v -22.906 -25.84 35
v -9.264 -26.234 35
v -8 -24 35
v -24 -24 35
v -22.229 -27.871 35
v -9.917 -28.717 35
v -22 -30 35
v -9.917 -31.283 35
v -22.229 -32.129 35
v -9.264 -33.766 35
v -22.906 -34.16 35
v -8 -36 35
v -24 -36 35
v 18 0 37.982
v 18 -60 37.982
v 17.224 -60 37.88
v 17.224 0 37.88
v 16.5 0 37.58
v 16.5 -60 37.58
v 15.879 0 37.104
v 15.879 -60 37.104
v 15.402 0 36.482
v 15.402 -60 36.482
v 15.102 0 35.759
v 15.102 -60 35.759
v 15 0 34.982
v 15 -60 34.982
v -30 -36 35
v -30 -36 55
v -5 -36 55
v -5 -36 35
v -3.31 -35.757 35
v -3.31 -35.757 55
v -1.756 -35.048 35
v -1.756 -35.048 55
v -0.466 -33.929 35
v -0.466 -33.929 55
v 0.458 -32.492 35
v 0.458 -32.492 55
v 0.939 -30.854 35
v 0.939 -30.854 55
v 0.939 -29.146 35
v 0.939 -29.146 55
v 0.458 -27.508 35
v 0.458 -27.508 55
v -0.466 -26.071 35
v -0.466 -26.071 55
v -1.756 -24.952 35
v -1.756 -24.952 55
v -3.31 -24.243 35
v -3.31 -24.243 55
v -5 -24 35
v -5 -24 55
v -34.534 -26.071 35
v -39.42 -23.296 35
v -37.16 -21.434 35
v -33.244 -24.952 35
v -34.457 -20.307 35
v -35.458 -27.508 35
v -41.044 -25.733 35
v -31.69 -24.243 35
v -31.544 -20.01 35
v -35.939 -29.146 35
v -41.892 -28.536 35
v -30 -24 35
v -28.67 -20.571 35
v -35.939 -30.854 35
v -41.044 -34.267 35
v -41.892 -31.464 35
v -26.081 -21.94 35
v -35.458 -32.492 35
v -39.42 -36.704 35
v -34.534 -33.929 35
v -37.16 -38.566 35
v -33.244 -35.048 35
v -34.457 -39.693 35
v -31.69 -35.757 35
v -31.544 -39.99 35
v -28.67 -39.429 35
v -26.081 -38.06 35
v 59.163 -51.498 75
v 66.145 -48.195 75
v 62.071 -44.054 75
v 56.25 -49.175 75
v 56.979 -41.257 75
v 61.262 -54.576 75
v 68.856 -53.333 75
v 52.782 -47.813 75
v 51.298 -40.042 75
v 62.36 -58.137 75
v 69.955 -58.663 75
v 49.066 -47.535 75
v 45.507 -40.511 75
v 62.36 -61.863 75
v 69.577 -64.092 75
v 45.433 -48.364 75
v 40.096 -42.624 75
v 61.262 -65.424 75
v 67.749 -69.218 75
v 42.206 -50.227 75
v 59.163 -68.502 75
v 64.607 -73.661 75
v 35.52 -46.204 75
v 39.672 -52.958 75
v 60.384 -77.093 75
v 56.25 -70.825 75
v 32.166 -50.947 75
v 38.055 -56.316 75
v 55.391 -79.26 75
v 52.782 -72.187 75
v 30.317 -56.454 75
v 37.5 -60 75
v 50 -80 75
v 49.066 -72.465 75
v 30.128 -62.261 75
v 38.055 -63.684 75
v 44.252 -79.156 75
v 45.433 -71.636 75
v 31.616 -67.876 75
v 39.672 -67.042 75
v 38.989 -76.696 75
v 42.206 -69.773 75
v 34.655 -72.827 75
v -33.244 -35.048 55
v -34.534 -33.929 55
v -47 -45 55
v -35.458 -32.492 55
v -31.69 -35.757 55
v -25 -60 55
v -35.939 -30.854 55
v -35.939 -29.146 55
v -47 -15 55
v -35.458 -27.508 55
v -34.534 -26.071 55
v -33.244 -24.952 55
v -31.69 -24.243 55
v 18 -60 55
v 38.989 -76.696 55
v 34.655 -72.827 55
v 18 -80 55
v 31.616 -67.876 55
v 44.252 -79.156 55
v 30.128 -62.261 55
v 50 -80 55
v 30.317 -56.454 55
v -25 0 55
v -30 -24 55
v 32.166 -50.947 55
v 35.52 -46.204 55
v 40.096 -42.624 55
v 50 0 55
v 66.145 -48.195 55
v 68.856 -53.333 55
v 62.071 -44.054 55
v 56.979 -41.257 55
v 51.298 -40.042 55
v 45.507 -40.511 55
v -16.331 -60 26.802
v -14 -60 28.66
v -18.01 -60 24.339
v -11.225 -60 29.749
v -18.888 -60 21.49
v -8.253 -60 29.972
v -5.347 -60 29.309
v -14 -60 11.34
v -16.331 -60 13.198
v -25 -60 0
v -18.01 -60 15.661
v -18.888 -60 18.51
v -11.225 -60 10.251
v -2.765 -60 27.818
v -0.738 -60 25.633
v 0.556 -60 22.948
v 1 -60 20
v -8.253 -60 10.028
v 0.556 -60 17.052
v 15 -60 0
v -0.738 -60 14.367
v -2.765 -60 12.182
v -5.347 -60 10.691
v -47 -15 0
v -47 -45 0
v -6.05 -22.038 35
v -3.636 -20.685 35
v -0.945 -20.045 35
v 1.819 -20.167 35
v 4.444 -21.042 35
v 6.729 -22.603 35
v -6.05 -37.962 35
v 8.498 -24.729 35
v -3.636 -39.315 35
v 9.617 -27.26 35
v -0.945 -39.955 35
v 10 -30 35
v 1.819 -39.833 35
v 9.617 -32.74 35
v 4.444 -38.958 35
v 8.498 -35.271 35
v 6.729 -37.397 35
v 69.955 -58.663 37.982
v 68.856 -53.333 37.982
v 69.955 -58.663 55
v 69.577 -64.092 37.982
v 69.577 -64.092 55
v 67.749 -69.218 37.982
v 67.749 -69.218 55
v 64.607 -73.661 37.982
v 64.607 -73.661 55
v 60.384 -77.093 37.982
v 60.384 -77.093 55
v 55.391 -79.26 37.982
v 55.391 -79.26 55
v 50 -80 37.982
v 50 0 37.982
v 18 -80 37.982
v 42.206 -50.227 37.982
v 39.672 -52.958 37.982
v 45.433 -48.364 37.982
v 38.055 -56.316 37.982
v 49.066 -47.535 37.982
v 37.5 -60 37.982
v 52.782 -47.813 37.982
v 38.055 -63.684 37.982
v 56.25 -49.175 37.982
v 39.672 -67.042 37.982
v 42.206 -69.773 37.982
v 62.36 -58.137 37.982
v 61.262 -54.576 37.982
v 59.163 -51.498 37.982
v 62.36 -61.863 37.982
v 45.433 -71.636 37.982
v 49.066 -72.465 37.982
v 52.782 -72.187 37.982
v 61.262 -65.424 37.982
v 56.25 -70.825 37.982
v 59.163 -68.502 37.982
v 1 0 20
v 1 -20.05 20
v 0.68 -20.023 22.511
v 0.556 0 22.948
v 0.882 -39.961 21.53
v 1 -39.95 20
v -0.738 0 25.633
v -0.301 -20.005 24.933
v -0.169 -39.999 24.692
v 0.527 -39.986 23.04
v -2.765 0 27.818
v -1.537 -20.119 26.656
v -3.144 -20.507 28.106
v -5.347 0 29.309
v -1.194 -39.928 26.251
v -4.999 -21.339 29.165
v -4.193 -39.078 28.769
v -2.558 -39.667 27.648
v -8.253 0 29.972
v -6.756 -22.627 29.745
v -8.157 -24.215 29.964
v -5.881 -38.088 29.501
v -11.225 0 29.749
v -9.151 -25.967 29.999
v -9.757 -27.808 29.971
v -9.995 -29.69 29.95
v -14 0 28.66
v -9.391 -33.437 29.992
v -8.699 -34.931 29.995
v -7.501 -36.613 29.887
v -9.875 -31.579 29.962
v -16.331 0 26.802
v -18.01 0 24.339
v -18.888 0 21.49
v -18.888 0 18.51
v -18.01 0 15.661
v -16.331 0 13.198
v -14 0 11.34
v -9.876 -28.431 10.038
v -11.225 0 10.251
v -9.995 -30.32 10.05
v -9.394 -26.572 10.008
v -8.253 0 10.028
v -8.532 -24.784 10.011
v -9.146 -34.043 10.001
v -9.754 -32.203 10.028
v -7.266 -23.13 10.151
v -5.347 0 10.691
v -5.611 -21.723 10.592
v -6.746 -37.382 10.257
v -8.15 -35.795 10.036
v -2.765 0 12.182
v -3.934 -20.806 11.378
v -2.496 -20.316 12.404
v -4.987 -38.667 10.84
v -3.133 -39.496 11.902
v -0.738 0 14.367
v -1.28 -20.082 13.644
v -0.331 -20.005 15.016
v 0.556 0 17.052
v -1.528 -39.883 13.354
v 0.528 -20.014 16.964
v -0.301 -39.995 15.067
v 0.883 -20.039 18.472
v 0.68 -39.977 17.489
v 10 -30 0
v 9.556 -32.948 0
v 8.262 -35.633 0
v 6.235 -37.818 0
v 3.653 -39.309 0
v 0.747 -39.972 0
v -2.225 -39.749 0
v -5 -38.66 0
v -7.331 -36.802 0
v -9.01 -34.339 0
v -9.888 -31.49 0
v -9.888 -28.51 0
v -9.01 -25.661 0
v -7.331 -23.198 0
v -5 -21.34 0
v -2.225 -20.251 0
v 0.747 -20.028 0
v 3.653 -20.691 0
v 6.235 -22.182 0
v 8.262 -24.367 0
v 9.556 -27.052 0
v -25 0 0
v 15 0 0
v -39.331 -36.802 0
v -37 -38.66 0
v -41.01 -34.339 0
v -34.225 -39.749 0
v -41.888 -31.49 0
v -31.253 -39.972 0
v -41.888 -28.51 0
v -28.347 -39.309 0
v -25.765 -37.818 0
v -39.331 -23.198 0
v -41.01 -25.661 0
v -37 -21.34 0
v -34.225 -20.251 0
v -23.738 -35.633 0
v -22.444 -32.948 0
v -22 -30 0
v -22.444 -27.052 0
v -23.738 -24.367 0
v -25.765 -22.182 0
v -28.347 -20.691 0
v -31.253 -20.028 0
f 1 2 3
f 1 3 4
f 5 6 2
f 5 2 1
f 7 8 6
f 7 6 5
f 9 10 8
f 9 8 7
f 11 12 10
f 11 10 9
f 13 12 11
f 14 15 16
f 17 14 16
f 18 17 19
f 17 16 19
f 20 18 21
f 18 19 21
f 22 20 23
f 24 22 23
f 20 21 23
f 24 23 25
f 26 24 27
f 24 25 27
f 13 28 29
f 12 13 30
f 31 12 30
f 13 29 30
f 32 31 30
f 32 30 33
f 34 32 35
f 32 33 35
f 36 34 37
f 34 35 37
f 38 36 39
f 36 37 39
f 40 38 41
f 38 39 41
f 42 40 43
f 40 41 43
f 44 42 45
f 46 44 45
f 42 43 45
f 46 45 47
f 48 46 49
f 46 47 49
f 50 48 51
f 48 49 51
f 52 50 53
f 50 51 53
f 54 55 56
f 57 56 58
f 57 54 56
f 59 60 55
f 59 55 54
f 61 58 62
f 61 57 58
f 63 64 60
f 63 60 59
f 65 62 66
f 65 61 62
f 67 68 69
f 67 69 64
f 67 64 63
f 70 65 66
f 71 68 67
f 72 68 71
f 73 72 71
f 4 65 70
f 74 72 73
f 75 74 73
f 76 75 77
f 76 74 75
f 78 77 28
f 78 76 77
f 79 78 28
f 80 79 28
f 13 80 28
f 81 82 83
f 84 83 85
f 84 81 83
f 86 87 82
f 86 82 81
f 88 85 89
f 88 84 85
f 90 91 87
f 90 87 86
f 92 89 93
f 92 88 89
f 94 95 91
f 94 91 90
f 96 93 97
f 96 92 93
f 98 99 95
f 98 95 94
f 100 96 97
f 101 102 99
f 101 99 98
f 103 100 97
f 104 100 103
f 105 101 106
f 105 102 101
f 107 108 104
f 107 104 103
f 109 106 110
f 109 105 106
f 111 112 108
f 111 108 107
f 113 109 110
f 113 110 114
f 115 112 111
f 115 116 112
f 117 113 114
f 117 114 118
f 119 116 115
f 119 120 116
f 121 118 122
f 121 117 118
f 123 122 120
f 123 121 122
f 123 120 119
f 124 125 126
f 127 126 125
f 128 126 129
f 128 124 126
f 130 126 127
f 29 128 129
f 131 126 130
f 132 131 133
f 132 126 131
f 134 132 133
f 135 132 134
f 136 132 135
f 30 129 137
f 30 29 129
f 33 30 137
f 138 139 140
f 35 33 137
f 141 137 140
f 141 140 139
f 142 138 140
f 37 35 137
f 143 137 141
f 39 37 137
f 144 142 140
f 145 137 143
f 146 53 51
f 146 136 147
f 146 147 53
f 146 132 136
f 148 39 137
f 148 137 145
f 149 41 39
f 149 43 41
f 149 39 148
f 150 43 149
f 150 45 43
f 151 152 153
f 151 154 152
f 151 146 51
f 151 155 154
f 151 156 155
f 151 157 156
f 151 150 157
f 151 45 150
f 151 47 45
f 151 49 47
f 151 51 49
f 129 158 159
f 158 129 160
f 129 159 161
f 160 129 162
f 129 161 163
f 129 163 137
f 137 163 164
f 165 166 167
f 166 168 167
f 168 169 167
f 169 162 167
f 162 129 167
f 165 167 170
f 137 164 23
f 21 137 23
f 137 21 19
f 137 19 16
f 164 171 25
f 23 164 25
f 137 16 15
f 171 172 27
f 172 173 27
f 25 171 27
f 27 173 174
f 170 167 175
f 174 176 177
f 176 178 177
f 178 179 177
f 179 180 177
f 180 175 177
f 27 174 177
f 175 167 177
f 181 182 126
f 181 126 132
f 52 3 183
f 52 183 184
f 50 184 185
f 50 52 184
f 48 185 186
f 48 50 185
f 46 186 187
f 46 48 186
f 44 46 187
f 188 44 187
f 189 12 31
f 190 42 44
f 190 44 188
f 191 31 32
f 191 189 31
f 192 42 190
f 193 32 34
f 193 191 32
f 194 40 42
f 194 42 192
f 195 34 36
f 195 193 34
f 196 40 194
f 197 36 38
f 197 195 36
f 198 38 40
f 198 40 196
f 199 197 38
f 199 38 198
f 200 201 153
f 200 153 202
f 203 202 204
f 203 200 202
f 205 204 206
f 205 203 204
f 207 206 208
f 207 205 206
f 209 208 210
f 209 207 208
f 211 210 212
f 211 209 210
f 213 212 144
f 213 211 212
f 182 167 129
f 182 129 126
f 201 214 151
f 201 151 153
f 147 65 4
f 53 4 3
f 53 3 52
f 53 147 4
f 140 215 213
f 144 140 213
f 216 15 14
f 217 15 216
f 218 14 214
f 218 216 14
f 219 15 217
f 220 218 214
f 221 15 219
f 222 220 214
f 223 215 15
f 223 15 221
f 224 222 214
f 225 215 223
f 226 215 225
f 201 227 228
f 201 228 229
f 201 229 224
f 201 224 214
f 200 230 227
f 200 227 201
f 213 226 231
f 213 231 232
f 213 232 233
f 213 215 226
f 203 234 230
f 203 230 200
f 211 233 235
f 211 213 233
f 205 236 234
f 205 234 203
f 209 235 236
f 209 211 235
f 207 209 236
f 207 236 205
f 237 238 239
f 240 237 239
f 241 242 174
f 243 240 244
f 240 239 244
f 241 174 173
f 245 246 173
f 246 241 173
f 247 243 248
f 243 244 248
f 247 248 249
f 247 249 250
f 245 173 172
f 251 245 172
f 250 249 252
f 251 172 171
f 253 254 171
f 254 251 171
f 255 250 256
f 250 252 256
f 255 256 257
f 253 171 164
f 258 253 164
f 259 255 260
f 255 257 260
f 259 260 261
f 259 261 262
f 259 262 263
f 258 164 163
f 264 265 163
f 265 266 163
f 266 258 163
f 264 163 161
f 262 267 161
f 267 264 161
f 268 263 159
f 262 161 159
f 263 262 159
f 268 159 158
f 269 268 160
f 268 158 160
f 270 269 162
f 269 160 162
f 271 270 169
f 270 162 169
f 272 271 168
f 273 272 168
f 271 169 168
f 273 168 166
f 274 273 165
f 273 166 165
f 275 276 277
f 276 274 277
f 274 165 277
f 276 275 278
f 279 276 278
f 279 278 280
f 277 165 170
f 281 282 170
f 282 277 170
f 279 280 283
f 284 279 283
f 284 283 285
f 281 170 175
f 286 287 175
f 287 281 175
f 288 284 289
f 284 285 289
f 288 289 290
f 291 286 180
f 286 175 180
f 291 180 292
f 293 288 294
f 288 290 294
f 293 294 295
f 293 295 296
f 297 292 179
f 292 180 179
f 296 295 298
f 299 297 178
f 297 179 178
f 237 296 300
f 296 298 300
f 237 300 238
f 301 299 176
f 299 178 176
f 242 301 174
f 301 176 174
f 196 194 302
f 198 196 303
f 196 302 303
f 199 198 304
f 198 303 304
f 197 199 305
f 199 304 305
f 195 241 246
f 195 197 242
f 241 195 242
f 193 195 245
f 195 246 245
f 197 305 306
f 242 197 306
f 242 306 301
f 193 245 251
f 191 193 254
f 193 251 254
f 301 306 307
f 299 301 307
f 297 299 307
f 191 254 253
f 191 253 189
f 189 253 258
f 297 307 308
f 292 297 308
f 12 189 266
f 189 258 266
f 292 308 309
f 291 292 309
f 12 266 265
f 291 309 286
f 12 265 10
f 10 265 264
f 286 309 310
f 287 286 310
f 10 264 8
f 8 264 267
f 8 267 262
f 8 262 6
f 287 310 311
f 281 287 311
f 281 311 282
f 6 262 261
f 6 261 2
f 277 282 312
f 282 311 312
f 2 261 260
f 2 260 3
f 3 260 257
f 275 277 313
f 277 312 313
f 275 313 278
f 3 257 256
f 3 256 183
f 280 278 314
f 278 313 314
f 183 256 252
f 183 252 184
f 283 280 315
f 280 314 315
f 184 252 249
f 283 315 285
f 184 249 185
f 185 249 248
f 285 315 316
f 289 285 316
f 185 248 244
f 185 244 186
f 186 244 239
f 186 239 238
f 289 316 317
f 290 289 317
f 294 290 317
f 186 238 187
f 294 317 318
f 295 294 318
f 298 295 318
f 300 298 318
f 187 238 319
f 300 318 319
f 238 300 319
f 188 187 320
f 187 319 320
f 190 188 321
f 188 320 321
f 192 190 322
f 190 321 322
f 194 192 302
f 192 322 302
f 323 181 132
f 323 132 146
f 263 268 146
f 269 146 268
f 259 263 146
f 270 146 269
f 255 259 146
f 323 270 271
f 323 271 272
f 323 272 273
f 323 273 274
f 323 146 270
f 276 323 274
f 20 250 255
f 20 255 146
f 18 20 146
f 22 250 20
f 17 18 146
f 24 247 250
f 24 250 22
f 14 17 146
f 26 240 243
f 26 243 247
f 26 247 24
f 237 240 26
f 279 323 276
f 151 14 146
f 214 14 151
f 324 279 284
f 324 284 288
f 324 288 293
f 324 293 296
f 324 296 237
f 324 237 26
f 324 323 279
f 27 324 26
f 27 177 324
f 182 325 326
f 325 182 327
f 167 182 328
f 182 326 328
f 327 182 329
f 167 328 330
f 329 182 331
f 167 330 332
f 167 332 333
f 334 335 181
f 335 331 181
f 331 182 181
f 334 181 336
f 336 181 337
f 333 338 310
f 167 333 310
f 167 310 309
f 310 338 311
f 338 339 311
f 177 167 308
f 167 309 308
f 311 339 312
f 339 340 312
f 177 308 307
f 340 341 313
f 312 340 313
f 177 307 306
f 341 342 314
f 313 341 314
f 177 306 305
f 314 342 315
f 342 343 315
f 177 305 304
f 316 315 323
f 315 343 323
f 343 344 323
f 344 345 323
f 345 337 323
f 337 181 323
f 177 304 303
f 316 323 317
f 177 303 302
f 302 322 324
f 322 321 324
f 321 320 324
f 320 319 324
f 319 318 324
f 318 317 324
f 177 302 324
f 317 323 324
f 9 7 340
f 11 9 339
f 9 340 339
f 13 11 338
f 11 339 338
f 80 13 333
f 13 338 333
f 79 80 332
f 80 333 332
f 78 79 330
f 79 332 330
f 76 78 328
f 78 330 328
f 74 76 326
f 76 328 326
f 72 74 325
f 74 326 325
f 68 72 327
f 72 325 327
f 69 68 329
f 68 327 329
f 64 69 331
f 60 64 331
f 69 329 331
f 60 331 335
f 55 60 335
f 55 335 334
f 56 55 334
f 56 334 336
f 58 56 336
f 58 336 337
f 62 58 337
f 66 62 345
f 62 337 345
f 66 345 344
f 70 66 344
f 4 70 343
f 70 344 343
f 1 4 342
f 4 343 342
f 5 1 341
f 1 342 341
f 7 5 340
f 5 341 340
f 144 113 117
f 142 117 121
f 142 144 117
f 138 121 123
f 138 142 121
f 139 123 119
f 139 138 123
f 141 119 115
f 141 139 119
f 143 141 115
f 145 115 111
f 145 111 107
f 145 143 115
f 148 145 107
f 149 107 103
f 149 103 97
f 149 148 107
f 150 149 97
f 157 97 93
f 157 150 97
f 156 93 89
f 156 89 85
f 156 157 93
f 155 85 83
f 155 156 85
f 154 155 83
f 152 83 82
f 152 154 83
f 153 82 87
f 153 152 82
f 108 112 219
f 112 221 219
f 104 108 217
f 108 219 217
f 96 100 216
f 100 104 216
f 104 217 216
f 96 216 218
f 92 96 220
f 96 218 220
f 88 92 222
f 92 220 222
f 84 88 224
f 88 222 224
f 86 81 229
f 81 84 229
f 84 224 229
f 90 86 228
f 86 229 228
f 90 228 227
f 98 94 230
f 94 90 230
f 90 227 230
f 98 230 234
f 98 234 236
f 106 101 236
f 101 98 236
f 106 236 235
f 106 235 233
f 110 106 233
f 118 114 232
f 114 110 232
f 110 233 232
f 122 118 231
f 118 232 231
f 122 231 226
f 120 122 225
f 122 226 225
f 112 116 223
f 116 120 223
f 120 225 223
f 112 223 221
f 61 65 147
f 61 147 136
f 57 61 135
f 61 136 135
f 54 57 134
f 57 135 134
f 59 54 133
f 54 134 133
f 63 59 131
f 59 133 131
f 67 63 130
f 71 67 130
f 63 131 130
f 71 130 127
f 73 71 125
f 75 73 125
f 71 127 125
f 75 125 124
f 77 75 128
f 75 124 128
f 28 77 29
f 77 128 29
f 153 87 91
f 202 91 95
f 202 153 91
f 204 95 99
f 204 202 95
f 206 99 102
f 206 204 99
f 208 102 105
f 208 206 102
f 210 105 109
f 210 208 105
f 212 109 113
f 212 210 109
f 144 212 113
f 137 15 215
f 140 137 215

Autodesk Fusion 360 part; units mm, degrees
sketch "Sketch1" plane through (0, 0, 0) normal (0, 0, 1) x (1, 0, 0)
  line L0 (0, 0) -> (50, 0)
  line L1 (0, 0) -> (-25, 0)
  line L2 (-47, -30) -> (50, -30)
  line L3 (-47, -30) -> (-47, -15)
  line L4 (-47, -30) -> (-47, -45)
  line L5 (-47, -15) -> (-25, 0)
  line L6 (-25, 0) -> (-25, -30)
  line L7 (-25, -30) -> (-25, -60)
  line L8 (-25, -60) -> (-47, -45)
  line L9 (-25, -60) -> (18, -60)
  line L10 (18, -60) -> (18, -30)
  line L11 (50, -30) -> (50, -60)
  circle A0 centre (50, -60) radius 12.5
  circle A1 centre (50, -60) radius 20
  line L12 (18, -60) -> (18, -80)
  line L13 (18, -80) -> (50, -80)
  line L14 (50, 0) -> (68.8562, -53.3333)
  dimension "d3" = 50
  dimension "d4" = 25
  dimension "d8" = 15
  dimension "d9" = 15
  dimension "d11" = 30
  dimension "d12" = 25
  dimension "d13" = 40
extrude "Extrude1" add sketch "Sketch1" along normal blind 55 contours L0 L1 L2 L6 L11 A1 L14 | L2 L3 L5 L6 | A0 | A1 | L2 L4 L7 L8 | L2 L7 L9 L10 | L2 L10 L11 A1 L12 L13
sketch "Sketch2" plane through (0, -80, 0) normal (0, -1, 0) x (1, 0, 0)
  line L0 (18, 0) -> (50, 0)
  line L1 (50, 0) -> (50, 55)
  line L2 (50, 55) -> (18, 55)
  line L3 (18, 55) -> (18, 0)
  line L4 (15, -0.0176) -> (15, 34.9824)
  line L5 (15, 34.9824) -> (18, 34.9824)
  circle A0 centre (18, 34.9824) radius 3
  line L6 (18, 34.9824) -> (18, 37.9824)
  line L7 (70.6384, 36.4824) -> (70.6384, -2.3651)
  line L8 (70.6384, -2.3651) -> (18, 0)
  line L9 (18, 37.9824) -> (30, 37.9824)
  line L10 (30, 37.9824) -> (71, 37.9824)
  line L11 (71, 37.9824) -> (70.6384, 36.4824)
  dimension "d17" = 35
  dimension "d19" = 3
  dimension "d20" = 6
extrude "Extrude2" cut sketch "Sketch2" against normal blind 115 contours L0 L1 L3 A0 L9 L10 | L0 L1 L7 L8 L10 L11 | L3 L5 A0 | L3 A0 L6 | L3 L5 A0 L6
sketch "Sketch3" plane through (0, -60, 0) normal (0, -1, 0) x (1, 0, 0)
  arc A0 (18, 37.9824) -> (18, 31.9824) centre (18, 34.9824) ccw
  line L0 (18, 37.9824) -> (18, 55)
  line L1 (18, 55) -> (-25, 55)
  line L2 (-25, 55) -> (-25, 0)
  line L3 (-25, 0) -> (18, 0)
  line L4 (18, 0) -> (18, 31.9824)
  line L5 (15, 34.9824) -> (18, 34.9824)
  line L6 (18, 34.9824) -> (18, 0)
  line L7 (18, 0) -> (15, 0)
  line L8 (15, 0) -> (15, 34.9824)
extrude "Extrude3" cut sketch "Sketch3" against normal blind 120 contours A0 L3 L4 L6 L7 L8
sketch "Sketch4" plane through (0, 0, 55) normal (0, 0, 1) x (-1, 0, 0)
  line L0 (-50, 0) -> (25, 0)
  line L1 (25, 0) -> (47, 15)
  line L2 (47, 15) -> (47, 45)
  line L3 (47, 45) -> (25, 60)
  line L4 (25, 60) -> (-18, 60)
  line L5 (-18, 60) -> (-18, 80)
  line L6 (-18, 80) -> (-50, 80)
  arc A0 (-50, 80) -> (-68.8562, 53.3333) centre (-50, 60) ccw
  line L7 (-68.8562, 53.3333) -> (-50, 0)
  line L8 (-50, 80) -> (-50, 60)
  line L9 (-50, 60) -> (-70, 60)
  circle A1 centre (-50, 60) radius 12.5
  dimension "d25" = 25
extrude "Extrude4" cut sketch "Sketch4" against normal blind 50 contours L8 L9 A1 | L8 L9 A1
sketch "Sketch5" plane through (0, 0, 55) normal (0, 0, 1) x (-1, 0, 0)
  circle A0 centre (-50, 60) radius 12.5
  line L0 (-50, 0) -> (25, 0)
  line L1 (25, 0) -> (47, 15)
  line L2 (47, 15) -> (47, 45)
  line L3 (47, 45) -> (25, 60)
  line L4 (25, 60) -> (-18, 60)
  line L5 (-18, 60) -> (-18, 80)
  line L6 (-18, 80) -> (-50, 80)
  arc A1 (-50, 80) -> (-68.8562, 53.3333) centre (-50, 60) ccw
  line L7 (-68.8562, 53.3333) -> (-50, 0)
  line L8 (47, 30) -> (47, 20)
  line L9 (47, 30) -> (47, 40)
  line L10 (47, 30) -> (30, 30)
  circle A2 centre (30, 30) radius 6
  line L11 (30, 30) -> (30, 24)
  line L12 (30, 30) -> (30, 36)
  line L13 (30, 30) -> (5, 30)
  circle A3 centre (5, 30) radius 6
  line L14 (30, 24) -> (5, 24)
  line L15 (30, 36) -> (5, 36)
  dimension "d28" = 10
  dimension "d29" = 10
  dimension "d30" = 17
  dimension "d31" = 12
  dimension "d32" = 25
  dimension "d33" = 12
extrude "Extrude5" cut sketch "Sketch5" against normal blind 20 contours L10 A2 L11 | L10 A2 L12 | A2 L12 L13 | A2 L11 L13 | A2 L13 A3 L15 | A2 L13 A3 L14 | A3
sketch "Sketch6" plane through (0, 0, 55) normal (0, 0, 1) x (-1, 0, 0)
  line L0 (5, 36) -> (30, 36)
  arc A0 (30, 24) -> (30, 36) centre (30, 30) ccw
  line L1 (30, 24) -> (5, 24)
  arc A1 (5, 36) -> (5, 24) centre (5, 30) ccw
  circle A2 centre (-50, 60) radius 12.5
  line L2 (-50, 0) -> (25, 0)
  line L3 (25, 0) -> (47, 15)
  line L4 (47, 15) -> (47, 45)
  line L5 (47, 45) -> (25, 60)
  line L6 (25, 60) -> (-18, 60)
  line L7 (-18, 60) -> (-18, 80)
  line L8 (-18, 80) -> (-50, 80)
  arc A3 (-50, 80) -> (-68.8562, 53.3333) centre (-50, 60) ccw
  line L9 (-68.8562, 53.3333) -> (-50, 0)
  circle A4 centre (-50, 60) radius 20
  circle A5 centre (-50, 60) radius 12.5
  dimension "d36" = 40
  dimension "d37" = 25
extrude "Extrude6" add sketch "Sketch6" along normal blind 20 contours A3 A4
sketch "Sketch7" plane through (0, -60, 0) normal (0, -1, 0) x (1, 0, 0)
  line L0 (15, 0) -> (15, 34.9824)
  arc A0 (18, 37.9824) -> (15, 34.9824) centre (18, 34.9824) ccw
  line L1 (18, 37.9824) -> (18, 55)
  line L2 (18, 55) -> (-25, 55)
  line L3 (-25, 55) -> (-25, 0)
  line L4 (-25, 0) -> (15, 0)
  line L5 (-47, 0) -> (-9, 0)
  line L6 (-9, 0) -> (-9, 20)
  circle A1 centre (-9, 20) radius 10
  dimension "d40" = 38
  dimension "d41" = 20
  dimension "d42" = 20
extrude "Extrude7" cut sketch "Sketch7" against normal blind 130 contours A1
sketch "Sketch8" plane through (0, 0, 0) normal (0, 0, -1) x (1, 0, 0)
  line L0 (15, 0) -> (15, 60)
  line L1 (15, 60) -> (-25, 60)
  line L2 (-25, 60) -> (-47, 45)
  line L3 (-47, 45) -> (-47, 15)
  line L4 (-47, 15) -> (-25, 0)
  line L5 (-25, 0) -> (15, 0)
  line L6 (-47, 30) -> (15, 30)
  line L7 (-47, 30) -> (-32, 30)
  line L8 (15, 30) -> (0, 30)
  circle A0 centre (-32, 30) radius 10
  circle A1 centre (0, 30) radius 10
  dimension "d45" = 15
  dimension "d46" = 15
  dimension "d47" = 20
  dimension "d48" = 20
extrude "Extrude8" cut sketch "Sketch8" against normal blind 35 contours L6 L8 A1 | L6 L8 A1 | L6 L7 A0 | L6 L7 A0
equation "d34 = -55.00 mm + 35 mm"
equation "d38 = 75.00 mm - 55 mm"
